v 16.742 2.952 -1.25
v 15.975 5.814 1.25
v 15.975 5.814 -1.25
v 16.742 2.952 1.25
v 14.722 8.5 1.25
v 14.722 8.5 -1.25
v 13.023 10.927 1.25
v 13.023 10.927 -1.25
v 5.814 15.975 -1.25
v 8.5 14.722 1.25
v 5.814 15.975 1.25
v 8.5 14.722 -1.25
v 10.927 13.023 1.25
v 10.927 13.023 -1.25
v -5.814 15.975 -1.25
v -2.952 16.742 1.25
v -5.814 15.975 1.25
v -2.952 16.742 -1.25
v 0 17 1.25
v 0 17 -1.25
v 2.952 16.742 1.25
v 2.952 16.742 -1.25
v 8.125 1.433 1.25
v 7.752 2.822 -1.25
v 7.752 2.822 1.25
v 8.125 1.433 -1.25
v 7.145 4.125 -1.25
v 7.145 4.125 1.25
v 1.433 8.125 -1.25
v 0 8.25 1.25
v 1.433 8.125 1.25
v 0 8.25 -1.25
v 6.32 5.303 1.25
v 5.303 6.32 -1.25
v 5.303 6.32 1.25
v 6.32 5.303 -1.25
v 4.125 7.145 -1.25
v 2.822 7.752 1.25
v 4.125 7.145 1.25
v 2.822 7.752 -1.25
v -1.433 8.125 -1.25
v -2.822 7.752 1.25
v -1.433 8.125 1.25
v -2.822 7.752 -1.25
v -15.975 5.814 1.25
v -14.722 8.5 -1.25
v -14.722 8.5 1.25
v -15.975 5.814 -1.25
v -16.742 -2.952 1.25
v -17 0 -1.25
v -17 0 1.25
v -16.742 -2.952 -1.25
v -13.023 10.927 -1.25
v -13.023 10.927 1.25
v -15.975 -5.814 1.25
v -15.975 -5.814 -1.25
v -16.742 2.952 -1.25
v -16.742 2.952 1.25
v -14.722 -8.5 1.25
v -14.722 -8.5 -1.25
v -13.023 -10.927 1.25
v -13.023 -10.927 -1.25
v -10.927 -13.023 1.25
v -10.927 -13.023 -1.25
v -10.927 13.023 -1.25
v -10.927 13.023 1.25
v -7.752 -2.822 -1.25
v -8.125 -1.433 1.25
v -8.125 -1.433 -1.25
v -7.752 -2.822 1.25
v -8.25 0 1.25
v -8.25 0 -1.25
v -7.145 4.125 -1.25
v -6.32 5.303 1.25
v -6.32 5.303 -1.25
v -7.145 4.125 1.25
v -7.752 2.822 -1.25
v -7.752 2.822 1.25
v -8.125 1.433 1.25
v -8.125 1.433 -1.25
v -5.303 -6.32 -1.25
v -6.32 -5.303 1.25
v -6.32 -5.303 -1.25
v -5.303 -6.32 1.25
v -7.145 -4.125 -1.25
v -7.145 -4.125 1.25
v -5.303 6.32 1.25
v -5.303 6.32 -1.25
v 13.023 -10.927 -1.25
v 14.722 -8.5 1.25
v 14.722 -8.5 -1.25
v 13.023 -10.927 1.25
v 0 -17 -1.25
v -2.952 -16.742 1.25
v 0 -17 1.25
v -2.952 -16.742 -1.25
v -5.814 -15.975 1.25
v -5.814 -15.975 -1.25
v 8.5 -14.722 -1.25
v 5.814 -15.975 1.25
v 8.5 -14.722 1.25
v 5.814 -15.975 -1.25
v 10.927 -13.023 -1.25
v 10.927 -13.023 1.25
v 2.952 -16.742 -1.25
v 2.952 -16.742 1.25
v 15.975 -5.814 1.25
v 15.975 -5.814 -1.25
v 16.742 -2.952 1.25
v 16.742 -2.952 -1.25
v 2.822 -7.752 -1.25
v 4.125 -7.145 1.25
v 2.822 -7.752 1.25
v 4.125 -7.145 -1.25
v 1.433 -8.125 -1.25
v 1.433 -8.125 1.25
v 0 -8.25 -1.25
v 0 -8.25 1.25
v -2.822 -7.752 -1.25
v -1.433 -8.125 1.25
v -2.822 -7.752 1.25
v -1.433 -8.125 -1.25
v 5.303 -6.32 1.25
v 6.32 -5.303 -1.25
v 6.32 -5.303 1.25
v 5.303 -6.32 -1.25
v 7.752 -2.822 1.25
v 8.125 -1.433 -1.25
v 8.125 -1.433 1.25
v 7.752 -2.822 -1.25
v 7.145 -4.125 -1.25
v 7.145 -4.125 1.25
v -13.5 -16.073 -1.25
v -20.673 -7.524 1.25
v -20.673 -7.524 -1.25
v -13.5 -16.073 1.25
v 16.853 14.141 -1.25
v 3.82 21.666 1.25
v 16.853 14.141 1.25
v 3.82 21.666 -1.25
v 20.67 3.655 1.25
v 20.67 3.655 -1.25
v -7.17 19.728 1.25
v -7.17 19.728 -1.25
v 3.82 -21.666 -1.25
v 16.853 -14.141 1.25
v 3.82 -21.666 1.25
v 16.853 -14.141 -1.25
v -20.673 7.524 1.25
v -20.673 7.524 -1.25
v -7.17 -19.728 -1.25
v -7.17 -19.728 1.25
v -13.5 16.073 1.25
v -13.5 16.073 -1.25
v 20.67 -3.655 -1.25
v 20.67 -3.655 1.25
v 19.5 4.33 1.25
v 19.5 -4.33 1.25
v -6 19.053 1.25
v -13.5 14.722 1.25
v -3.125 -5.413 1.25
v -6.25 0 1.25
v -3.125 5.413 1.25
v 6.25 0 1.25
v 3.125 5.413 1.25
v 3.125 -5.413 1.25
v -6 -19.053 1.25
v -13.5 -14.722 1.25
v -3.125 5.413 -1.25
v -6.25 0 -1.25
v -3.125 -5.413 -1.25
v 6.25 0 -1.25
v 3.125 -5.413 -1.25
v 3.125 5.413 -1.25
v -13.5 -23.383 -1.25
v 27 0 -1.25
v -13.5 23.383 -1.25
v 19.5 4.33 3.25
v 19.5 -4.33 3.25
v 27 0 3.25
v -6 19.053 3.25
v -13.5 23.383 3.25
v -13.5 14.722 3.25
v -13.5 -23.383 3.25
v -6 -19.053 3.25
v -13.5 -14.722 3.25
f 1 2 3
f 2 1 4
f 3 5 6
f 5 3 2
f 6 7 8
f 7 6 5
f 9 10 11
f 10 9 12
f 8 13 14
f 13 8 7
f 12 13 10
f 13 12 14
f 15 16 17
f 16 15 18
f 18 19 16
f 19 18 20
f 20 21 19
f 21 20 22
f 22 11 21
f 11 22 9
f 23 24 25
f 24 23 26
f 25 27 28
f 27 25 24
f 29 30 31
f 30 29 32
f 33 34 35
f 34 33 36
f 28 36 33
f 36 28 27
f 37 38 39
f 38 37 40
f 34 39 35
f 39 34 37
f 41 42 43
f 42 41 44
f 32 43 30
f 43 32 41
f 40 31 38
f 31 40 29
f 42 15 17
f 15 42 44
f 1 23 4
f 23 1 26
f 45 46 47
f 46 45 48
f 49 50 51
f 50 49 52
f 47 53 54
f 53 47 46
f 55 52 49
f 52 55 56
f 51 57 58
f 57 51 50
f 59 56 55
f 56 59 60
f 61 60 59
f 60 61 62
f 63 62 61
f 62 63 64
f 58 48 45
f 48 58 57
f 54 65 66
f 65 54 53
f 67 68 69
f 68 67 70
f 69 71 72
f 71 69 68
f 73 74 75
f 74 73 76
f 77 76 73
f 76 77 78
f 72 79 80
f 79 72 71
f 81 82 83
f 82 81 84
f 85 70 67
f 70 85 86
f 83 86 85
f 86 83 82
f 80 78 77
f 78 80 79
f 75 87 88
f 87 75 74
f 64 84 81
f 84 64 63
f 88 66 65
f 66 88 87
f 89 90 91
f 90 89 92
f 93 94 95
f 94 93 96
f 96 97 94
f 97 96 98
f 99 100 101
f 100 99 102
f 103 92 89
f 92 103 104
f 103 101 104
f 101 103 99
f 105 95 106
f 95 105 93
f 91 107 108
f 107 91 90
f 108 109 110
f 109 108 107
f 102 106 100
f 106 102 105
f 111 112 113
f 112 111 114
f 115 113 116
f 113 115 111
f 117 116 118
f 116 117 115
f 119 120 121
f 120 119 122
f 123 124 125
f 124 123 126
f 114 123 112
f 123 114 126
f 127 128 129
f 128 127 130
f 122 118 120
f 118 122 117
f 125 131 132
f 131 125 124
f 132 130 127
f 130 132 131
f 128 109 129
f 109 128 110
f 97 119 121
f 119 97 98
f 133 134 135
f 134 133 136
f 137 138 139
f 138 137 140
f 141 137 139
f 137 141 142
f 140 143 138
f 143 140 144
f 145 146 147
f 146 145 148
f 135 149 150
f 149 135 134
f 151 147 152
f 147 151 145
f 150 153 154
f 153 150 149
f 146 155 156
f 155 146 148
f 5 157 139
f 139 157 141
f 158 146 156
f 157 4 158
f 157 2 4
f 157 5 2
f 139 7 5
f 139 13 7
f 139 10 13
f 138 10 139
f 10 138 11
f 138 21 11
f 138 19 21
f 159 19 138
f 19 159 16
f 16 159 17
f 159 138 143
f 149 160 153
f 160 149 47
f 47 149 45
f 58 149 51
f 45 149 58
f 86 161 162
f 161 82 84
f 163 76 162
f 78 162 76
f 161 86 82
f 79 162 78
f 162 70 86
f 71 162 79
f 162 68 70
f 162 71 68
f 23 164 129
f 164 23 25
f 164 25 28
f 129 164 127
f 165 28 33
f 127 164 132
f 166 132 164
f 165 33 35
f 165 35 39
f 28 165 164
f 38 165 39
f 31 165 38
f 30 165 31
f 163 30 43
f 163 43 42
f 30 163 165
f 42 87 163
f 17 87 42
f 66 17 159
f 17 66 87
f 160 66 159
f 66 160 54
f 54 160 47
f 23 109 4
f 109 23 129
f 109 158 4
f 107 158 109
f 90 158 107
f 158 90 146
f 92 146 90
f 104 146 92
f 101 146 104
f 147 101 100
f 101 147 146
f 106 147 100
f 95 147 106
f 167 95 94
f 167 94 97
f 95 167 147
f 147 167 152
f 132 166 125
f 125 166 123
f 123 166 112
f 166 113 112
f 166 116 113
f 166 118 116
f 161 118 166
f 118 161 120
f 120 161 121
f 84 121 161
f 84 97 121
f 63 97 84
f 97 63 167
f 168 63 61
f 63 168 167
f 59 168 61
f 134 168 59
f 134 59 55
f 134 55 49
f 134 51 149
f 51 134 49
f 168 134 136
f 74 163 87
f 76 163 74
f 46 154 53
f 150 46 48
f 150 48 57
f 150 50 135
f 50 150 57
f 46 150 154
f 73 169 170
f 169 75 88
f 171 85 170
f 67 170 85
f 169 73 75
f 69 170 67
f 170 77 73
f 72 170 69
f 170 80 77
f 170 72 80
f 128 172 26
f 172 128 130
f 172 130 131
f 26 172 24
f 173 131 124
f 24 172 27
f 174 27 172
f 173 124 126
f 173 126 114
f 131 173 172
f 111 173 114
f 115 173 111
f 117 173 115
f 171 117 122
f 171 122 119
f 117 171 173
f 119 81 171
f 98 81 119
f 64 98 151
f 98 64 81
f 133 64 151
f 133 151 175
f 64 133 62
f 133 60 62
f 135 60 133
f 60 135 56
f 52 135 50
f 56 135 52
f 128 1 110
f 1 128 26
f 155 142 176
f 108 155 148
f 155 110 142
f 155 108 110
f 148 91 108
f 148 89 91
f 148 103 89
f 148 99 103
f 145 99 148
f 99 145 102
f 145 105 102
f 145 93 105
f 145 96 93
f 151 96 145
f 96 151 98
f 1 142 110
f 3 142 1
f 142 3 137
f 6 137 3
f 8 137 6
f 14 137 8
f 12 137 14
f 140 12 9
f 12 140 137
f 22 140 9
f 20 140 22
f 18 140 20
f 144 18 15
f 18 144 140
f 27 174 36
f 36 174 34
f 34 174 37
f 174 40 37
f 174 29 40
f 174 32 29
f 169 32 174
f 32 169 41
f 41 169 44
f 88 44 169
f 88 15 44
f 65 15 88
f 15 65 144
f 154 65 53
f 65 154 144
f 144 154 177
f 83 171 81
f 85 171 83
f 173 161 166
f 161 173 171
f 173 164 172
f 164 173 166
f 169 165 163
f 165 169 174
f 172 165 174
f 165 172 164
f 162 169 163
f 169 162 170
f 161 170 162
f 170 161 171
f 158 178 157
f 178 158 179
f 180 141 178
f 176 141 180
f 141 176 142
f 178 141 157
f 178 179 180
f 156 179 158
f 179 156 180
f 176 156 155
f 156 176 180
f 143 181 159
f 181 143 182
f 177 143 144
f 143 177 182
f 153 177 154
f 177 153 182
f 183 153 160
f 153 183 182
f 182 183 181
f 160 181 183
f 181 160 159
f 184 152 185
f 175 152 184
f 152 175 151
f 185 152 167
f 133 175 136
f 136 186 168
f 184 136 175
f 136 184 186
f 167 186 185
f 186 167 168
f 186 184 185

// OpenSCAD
// Modular Tops Disc Generator
// 2019/03/04
// Update 1a: 2019/03/05
// Author: crashdebug
// Licensed under the Creative Commons - Attribution - Non-Commercial - 
// Share Alike license. 
// https://www.thingiverse.com/crashdebug
//
// For Modular Tops construction kit:
// https://www.thingiverse.com/thing:3440472

// disc user parameters
// -----------------------------------------------
// diameter for standard small disc=44, standard large disc=52
disc_diameter = 44;
// single, double or triple thickness
disc_thickness = 1;                 // [1:1:3]
// number of sides of the disc
disc_sides = 9;                     // [3:1:36]

/* [Spokes] */
// number of spokes (0 for no spokes)
num_spokes = 3;                     // [0,2,3,4,5,6,7,8,9,10,11,12]
// outer ring width when using spokes
outer_ring_width = 5;
// inner ring width additional to standard of 2 mm
inner_ring_width_add = 0;
// objects to add around edge

/* [Edge Objects] */
// number of edge objects, 0 for none
num_edge_objects = 3;               
// shape of edge objects
edge_objects_type = "triangle";       // [triangle, square, octagon, round]
// size/radius of edge objects
edge_objects_size = 5;
// thickness additional to disc thickness
edge_objects_thick_add = 2;
// position from center
edge_objects_pos = disc_diameter/2;

/* [Advanced] */
// Angular offset of spokes
spoke_offset = 0;
// Angular offset of edge objects
edge_offset = 0;
// Angular offset of center hex receiver
center_offset = 0;

// preview[view:south, tilt:top]

/* [Hidden] */

thickness = 2.5 * disc_thickness;
radius = disc_diameter/2.0;

spoke_angle = 20; // 20 degrees per spoke
spoke_total_angle = spoke_angle * num_spokes;
spoke_reminder = 360-spoke_total_angle;
spoke_space_angle = spoke_reminder / num_spokes;

spoke_start_radius = 8.25 + inner_ring_width_add;
spoke_end_radius = radius - outer_ring_width;

hole_radius = 6.25;

edge_fn = edge_objects_type=="triangle" ? 3 :
          edge_objects_type=="square" ? 4 :
          edge_objects_type=="octagon" ? 8 :
          edge_objects_type=="round" ? 36 : 36;


// creates one of the spoke cutter tools
// which = 1 to num_of_spokes (which one to create)
module make_spoke_cutter(which) {
    sah = spoke_angle/2;
    sa = spoke_angle;
    
    difference() {
        cylinder(thickness*2,spoke_end_radius, spoke_end_radius, $fn=36, center=true);
        cylinder(thickness*2.1,spoke_start_radius, spoke_start_radius, $fn=36, center=true);
        rotate([0,0,sah+(which-1)*sa+which*spoke_space_angle + spoke_offset])
            translate([-disc_diameter/2,0,-thickness*3/2])
                cube([disc_diameter,radius,thickness*3]);    
        rotate([0,0,sah+(which-1)*sa+(which-1)*spoke_space_angle + spoke_offset])
            translate([-disc_diameter/2,-radius,-thickness*3/2])
                cube([disc_diameter,radius,thickness*3]);
    }
}

module make_edge_shape() {
    if(edge_objects_type=="square") {
        translate([-edge_objects_size,-edge_objects_size,0])
        cube([edge_objects_size*2,edge_objects_size*2,thickness+edge_objects_thick_add]);
    } else {
        cylinder(thickness+edge_objects_thick_add,edge_objects_size, edge_objects_size, $fn=edge_fn);
    }
        
}

module make_edge_obj(which) {
    ea = 360/num_edge_objects;
    
    rotate([0,0,(which-1)*ea + edge_offset])
        translate([edge_objects_pos,0,-thickness/2])
            make_edge_shape();
        
}

union() {
    difference() {
        cylinder(thickness, radius, radius, $fn=disc_sides, center=true);
        
        if ( num_spokes != 0 ) {
            for(i=[1:num_spokes]) {
                make_spoke_cutter(i);
            }
        }
        
        rotate([0,0,center_offset])
            cylinder(thickness*2, hole_radius, hole_radius, $fn=6, center=true);
    }

    if ( num_edge_objects != 0 ) {
        for(i=[1:num_edge_objects]){
            make_edge_obj(i);
        }
    }
}
